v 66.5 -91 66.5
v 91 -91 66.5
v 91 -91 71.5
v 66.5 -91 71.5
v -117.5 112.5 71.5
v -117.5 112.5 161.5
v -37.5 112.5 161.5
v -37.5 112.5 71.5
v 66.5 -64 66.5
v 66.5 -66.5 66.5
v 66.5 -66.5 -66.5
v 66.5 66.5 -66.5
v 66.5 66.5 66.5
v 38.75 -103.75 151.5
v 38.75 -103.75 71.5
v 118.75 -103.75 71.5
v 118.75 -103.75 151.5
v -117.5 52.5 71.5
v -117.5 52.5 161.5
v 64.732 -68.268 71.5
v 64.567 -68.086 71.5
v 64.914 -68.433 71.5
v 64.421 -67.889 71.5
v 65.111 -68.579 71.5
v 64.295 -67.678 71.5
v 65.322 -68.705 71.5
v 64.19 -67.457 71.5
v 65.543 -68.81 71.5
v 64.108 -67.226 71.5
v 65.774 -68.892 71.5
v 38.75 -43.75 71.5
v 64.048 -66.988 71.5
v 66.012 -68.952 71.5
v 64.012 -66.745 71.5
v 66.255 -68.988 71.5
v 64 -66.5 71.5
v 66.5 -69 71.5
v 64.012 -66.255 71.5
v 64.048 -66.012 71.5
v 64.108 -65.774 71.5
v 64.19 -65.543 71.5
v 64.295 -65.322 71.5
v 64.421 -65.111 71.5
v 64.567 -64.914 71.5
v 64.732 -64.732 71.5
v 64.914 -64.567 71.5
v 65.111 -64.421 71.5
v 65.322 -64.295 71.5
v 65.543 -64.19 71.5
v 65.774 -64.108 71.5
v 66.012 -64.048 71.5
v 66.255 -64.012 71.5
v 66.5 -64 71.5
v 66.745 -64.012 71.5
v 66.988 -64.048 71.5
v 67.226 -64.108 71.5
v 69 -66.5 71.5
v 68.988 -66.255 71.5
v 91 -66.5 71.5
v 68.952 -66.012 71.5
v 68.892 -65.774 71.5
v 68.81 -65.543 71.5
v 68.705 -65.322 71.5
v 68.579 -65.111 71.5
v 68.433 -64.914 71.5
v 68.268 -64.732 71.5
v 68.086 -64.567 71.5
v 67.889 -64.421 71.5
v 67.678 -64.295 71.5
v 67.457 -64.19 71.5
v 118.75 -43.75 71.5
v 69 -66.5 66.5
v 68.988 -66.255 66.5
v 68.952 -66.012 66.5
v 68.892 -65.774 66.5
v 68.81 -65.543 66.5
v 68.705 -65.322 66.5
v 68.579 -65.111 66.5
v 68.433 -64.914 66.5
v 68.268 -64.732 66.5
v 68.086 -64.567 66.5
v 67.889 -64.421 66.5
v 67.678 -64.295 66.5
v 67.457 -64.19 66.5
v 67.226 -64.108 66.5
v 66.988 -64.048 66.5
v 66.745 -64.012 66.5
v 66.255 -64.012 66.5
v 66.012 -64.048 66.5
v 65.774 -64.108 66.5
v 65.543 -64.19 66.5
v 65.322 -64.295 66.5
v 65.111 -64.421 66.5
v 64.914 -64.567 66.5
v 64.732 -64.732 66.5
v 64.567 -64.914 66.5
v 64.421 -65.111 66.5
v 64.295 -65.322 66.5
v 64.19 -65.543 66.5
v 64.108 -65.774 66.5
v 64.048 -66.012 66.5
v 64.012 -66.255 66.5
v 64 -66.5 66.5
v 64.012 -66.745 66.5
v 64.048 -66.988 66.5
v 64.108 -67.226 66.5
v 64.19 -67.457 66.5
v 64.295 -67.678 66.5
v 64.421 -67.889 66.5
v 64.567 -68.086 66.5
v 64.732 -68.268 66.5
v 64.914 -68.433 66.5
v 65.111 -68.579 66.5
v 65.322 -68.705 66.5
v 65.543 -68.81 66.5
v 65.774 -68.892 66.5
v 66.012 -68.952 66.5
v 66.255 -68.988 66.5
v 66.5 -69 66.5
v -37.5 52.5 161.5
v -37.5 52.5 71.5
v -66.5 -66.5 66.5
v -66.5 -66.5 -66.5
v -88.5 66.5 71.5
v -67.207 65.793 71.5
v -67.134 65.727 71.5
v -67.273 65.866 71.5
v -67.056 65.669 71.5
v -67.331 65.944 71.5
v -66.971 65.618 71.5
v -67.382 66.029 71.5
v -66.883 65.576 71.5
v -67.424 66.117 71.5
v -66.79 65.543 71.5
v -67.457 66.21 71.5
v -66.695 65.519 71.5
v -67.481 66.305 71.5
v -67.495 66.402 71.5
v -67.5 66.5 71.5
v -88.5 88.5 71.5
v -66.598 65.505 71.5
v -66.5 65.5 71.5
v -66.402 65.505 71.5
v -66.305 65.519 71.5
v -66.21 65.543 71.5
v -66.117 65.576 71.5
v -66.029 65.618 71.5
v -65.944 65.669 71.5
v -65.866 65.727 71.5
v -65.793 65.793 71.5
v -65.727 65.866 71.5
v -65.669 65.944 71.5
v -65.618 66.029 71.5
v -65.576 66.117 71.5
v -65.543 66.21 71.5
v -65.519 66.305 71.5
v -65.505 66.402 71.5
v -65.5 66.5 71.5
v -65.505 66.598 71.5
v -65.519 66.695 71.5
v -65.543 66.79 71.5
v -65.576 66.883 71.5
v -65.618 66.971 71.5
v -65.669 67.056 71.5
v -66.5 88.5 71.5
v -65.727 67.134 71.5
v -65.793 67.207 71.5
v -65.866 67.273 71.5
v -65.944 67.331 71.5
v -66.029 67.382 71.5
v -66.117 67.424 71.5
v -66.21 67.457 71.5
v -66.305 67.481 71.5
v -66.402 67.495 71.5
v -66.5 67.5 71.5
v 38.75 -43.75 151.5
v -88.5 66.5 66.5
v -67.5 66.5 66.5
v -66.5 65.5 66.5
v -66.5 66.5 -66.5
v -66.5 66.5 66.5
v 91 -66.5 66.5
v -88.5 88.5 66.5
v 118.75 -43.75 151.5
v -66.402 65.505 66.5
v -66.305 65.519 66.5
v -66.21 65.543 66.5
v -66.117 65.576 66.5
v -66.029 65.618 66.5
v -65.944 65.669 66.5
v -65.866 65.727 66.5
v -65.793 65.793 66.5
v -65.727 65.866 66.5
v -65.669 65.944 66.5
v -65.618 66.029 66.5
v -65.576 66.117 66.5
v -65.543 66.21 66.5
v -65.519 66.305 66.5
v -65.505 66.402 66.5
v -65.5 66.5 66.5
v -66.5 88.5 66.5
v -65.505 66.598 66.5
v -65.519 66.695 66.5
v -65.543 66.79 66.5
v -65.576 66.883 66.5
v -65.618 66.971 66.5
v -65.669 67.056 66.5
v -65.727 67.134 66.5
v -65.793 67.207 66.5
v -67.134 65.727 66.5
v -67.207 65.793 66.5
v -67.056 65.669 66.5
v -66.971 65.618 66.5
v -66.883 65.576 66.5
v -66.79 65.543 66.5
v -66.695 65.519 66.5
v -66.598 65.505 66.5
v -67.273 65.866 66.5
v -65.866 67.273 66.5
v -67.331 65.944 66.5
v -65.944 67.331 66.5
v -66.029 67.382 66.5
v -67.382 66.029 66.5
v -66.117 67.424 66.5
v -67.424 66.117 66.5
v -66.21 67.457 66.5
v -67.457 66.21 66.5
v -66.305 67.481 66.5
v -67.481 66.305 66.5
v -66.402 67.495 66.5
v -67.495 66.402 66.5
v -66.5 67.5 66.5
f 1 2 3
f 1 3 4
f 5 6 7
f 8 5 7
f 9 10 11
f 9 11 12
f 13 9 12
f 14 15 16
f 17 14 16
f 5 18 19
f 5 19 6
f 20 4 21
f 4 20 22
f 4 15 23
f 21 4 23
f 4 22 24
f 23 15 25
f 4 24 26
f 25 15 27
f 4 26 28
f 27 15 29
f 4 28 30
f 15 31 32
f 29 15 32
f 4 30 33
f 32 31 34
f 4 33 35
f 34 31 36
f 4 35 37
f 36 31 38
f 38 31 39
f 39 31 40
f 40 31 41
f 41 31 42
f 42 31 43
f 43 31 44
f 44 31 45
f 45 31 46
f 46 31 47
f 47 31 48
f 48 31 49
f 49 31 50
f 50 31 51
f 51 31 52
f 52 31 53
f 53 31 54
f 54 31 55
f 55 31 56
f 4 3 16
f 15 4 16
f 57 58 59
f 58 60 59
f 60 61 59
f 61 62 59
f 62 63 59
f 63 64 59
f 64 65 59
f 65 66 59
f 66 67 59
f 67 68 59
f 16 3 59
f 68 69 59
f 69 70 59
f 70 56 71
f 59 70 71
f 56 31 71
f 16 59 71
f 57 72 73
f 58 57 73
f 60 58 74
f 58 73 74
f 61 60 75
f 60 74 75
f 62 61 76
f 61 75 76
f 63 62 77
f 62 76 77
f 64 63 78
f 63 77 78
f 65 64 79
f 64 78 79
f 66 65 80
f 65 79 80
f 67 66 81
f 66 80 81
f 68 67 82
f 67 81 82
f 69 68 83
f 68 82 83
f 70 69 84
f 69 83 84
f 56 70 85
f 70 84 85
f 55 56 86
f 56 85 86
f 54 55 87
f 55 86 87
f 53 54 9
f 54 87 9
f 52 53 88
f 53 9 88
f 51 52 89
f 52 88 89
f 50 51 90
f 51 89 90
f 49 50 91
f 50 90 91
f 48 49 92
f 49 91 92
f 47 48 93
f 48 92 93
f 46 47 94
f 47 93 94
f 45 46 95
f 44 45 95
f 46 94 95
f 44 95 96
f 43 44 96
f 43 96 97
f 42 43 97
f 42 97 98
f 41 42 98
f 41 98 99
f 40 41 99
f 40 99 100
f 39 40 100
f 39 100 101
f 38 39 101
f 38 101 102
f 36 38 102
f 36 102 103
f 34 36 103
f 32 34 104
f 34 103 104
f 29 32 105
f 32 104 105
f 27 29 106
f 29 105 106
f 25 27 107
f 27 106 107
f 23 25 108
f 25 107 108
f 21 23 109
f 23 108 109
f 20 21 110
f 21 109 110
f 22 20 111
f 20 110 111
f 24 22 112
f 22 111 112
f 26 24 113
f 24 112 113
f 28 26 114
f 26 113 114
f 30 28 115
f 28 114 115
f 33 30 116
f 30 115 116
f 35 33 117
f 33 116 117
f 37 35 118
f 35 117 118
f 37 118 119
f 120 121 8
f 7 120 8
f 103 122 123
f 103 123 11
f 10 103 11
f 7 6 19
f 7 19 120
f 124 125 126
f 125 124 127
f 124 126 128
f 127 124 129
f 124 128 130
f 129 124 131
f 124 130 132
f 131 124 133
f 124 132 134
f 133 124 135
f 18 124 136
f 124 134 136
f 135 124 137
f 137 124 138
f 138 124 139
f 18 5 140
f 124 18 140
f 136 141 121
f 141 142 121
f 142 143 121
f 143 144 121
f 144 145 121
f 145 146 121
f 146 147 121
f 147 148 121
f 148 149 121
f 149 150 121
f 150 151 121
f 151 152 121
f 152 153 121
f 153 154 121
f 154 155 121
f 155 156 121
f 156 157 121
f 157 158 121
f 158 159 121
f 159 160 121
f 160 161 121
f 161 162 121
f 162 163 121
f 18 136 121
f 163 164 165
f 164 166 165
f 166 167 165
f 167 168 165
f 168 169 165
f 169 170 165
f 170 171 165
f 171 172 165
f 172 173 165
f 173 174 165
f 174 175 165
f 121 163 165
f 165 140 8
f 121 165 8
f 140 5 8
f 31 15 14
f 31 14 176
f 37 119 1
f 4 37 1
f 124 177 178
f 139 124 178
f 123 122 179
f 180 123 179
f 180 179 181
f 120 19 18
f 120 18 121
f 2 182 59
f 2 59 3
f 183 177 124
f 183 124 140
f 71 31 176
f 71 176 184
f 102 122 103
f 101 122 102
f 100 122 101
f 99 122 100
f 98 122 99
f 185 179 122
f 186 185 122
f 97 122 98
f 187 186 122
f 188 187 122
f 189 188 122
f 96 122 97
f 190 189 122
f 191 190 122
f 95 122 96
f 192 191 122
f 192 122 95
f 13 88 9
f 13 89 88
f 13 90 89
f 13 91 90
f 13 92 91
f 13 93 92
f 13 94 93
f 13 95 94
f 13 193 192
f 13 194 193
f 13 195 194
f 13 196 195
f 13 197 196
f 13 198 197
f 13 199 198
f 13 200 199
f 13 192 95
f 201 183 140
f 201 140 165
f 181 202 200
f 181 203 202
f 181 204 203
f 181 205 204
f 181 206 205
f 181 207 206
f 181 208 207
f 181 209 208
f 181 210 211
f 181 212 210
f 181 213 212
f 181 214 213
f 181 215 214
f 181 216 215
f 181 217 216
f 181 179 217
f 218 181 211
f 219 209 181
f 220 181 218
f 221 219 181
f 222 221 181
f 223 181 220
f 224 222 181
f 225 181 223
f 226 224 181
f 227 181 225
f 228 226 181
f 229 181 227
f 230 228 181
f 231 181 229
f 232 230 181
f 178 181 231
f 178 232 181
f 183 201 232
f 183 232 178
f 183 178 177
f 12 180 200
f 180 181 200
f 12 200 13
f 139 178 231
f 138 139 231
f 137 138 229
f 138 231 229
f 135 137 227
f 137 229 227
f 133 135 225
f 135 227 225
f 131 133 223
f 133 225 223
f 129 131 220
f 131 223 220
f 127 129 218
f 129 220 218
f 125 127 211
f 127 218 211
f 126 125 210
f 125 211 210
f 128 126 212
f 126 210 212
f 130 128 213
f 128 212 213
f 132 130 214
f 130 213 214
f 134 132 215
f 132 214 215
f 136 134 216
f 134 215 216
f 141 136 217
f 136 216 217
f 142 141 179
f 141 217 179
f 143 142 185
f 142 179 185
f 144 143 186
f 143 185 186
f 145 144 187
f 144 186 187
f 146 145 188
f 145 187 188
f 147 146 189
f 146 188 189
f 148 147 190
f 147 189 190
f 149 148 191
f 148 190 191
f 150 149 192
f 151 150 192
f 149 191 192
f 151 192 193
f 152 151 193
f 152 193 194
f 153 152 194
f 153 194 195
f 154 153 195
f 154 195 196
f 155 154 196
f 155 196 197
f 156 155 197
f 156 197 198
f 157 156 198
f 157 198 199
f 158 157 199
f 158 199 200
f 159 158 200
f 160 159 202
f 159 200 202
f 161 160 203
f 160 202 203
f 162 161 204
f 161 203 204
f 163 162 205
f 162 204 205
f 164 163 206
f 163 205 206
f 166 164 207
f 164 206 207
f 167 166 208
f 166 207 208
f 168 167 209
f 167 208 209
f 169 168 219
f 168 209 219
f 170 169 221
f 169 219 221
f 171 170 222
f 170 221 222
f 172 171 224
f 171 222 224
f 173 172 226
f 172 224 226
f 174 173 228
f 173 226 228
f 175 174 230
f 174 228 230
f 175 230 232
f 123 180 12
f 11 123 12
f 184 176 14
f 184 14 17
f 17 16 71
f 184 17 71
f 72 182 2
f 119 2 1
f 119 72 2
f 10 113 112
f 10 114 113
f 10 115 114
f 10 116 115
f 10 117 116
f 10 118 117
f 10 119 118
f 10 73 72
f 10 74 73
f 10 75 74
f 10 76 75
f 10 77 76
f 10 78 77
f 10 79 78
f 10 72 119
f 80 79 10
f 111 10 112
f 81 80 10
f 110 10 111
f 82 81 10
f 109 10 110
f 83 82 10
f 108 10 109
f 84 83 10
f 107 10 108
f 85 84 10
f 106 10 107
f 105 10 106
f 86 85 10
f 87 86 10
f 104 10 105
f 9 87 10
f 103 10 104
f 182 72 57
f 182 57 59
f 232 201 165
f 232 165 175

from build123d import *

# Parameters (mm, degrees)
SKETCH040_W  = 133
SKETCH040_H  = 133
PAD038_DEPTH = 66.5
PAD039_DEPTH = 5
SKETCH043_W  = 80
SKETCH043_H  = 60
PAD040_DEPTH = 90
PAD046_DEPTH = 5
SKETCH050_W  = 80
SKETCH050_H  = 60
PAD047_DEPTH = 80


with BuildPart() as part:
    # Sketch040 → Pad038 (new body, symmetric)
    with BuildSketch(Plane.XY):
        Rectangle(SKETCH040_W, SKETCH040_H)
    extrude(amount=PAD038_DEPTH, both=True)

    # Sketch041 (on Face6 of Pad038) → Pad039 (join)
    with BuildSketch(Plane.XY.offset(66.5)):
        with BuildLine():
            Line((-88.5, 88.5), (-66.5, 88.5))
            Line((-66.5, 88.5), (-66.5, 67.5))
            ThreePointArc((-67.5, 66.5), (-65.792893, 65.792893), (-66.5, 67.5))
            Line((-88.5, 66.5), (-67.5, 66.5))
            Line((-88.5, 66.5), (-88.5, 88.5))
        make_face()
    extrude(amount=PAD039_DEPTH)

    # Sketch043 (on Face13 of Pad039) → Pad040 (join)
    with BuildSketch(Plane.XY.offset(71.5)):
        with Locations((-77.5, 82.5)):
            Rectangle(SKETCH043_W, SKETCH043_H)
    extrude(amount=PAD040_DEPTH)

    # Sketch049 (on Face13 of Pad040) → Pad046 (join)
    with BuildSketch(Plane.XY.offset(66.5)):
        with BuildLine():
            Line((91, -66.5), (91, -91))
            Line((91, -91), (66.5, -91))
            Line((66.5, -69), (66.5, -91))
            ThreePointArc((69, -66.5), (64.732233, -64.732233), (66.5, -69))
            Line((69, -66.5), (91, -66.5))
        make_face()
    extrude(amount=PAD046_DEPTH)

    # Sketch050 (on Face23 of Pad046) → Pad047 (join)
    with BuildSketch(Plane.XY.offset(71.5)):
        with Locations((78.75, -73.75)):
            Rectangle(SKETCH050_W, SKETCH050_H)
    extrude(amount=PAD047_DEPTH)


solid = part.part
